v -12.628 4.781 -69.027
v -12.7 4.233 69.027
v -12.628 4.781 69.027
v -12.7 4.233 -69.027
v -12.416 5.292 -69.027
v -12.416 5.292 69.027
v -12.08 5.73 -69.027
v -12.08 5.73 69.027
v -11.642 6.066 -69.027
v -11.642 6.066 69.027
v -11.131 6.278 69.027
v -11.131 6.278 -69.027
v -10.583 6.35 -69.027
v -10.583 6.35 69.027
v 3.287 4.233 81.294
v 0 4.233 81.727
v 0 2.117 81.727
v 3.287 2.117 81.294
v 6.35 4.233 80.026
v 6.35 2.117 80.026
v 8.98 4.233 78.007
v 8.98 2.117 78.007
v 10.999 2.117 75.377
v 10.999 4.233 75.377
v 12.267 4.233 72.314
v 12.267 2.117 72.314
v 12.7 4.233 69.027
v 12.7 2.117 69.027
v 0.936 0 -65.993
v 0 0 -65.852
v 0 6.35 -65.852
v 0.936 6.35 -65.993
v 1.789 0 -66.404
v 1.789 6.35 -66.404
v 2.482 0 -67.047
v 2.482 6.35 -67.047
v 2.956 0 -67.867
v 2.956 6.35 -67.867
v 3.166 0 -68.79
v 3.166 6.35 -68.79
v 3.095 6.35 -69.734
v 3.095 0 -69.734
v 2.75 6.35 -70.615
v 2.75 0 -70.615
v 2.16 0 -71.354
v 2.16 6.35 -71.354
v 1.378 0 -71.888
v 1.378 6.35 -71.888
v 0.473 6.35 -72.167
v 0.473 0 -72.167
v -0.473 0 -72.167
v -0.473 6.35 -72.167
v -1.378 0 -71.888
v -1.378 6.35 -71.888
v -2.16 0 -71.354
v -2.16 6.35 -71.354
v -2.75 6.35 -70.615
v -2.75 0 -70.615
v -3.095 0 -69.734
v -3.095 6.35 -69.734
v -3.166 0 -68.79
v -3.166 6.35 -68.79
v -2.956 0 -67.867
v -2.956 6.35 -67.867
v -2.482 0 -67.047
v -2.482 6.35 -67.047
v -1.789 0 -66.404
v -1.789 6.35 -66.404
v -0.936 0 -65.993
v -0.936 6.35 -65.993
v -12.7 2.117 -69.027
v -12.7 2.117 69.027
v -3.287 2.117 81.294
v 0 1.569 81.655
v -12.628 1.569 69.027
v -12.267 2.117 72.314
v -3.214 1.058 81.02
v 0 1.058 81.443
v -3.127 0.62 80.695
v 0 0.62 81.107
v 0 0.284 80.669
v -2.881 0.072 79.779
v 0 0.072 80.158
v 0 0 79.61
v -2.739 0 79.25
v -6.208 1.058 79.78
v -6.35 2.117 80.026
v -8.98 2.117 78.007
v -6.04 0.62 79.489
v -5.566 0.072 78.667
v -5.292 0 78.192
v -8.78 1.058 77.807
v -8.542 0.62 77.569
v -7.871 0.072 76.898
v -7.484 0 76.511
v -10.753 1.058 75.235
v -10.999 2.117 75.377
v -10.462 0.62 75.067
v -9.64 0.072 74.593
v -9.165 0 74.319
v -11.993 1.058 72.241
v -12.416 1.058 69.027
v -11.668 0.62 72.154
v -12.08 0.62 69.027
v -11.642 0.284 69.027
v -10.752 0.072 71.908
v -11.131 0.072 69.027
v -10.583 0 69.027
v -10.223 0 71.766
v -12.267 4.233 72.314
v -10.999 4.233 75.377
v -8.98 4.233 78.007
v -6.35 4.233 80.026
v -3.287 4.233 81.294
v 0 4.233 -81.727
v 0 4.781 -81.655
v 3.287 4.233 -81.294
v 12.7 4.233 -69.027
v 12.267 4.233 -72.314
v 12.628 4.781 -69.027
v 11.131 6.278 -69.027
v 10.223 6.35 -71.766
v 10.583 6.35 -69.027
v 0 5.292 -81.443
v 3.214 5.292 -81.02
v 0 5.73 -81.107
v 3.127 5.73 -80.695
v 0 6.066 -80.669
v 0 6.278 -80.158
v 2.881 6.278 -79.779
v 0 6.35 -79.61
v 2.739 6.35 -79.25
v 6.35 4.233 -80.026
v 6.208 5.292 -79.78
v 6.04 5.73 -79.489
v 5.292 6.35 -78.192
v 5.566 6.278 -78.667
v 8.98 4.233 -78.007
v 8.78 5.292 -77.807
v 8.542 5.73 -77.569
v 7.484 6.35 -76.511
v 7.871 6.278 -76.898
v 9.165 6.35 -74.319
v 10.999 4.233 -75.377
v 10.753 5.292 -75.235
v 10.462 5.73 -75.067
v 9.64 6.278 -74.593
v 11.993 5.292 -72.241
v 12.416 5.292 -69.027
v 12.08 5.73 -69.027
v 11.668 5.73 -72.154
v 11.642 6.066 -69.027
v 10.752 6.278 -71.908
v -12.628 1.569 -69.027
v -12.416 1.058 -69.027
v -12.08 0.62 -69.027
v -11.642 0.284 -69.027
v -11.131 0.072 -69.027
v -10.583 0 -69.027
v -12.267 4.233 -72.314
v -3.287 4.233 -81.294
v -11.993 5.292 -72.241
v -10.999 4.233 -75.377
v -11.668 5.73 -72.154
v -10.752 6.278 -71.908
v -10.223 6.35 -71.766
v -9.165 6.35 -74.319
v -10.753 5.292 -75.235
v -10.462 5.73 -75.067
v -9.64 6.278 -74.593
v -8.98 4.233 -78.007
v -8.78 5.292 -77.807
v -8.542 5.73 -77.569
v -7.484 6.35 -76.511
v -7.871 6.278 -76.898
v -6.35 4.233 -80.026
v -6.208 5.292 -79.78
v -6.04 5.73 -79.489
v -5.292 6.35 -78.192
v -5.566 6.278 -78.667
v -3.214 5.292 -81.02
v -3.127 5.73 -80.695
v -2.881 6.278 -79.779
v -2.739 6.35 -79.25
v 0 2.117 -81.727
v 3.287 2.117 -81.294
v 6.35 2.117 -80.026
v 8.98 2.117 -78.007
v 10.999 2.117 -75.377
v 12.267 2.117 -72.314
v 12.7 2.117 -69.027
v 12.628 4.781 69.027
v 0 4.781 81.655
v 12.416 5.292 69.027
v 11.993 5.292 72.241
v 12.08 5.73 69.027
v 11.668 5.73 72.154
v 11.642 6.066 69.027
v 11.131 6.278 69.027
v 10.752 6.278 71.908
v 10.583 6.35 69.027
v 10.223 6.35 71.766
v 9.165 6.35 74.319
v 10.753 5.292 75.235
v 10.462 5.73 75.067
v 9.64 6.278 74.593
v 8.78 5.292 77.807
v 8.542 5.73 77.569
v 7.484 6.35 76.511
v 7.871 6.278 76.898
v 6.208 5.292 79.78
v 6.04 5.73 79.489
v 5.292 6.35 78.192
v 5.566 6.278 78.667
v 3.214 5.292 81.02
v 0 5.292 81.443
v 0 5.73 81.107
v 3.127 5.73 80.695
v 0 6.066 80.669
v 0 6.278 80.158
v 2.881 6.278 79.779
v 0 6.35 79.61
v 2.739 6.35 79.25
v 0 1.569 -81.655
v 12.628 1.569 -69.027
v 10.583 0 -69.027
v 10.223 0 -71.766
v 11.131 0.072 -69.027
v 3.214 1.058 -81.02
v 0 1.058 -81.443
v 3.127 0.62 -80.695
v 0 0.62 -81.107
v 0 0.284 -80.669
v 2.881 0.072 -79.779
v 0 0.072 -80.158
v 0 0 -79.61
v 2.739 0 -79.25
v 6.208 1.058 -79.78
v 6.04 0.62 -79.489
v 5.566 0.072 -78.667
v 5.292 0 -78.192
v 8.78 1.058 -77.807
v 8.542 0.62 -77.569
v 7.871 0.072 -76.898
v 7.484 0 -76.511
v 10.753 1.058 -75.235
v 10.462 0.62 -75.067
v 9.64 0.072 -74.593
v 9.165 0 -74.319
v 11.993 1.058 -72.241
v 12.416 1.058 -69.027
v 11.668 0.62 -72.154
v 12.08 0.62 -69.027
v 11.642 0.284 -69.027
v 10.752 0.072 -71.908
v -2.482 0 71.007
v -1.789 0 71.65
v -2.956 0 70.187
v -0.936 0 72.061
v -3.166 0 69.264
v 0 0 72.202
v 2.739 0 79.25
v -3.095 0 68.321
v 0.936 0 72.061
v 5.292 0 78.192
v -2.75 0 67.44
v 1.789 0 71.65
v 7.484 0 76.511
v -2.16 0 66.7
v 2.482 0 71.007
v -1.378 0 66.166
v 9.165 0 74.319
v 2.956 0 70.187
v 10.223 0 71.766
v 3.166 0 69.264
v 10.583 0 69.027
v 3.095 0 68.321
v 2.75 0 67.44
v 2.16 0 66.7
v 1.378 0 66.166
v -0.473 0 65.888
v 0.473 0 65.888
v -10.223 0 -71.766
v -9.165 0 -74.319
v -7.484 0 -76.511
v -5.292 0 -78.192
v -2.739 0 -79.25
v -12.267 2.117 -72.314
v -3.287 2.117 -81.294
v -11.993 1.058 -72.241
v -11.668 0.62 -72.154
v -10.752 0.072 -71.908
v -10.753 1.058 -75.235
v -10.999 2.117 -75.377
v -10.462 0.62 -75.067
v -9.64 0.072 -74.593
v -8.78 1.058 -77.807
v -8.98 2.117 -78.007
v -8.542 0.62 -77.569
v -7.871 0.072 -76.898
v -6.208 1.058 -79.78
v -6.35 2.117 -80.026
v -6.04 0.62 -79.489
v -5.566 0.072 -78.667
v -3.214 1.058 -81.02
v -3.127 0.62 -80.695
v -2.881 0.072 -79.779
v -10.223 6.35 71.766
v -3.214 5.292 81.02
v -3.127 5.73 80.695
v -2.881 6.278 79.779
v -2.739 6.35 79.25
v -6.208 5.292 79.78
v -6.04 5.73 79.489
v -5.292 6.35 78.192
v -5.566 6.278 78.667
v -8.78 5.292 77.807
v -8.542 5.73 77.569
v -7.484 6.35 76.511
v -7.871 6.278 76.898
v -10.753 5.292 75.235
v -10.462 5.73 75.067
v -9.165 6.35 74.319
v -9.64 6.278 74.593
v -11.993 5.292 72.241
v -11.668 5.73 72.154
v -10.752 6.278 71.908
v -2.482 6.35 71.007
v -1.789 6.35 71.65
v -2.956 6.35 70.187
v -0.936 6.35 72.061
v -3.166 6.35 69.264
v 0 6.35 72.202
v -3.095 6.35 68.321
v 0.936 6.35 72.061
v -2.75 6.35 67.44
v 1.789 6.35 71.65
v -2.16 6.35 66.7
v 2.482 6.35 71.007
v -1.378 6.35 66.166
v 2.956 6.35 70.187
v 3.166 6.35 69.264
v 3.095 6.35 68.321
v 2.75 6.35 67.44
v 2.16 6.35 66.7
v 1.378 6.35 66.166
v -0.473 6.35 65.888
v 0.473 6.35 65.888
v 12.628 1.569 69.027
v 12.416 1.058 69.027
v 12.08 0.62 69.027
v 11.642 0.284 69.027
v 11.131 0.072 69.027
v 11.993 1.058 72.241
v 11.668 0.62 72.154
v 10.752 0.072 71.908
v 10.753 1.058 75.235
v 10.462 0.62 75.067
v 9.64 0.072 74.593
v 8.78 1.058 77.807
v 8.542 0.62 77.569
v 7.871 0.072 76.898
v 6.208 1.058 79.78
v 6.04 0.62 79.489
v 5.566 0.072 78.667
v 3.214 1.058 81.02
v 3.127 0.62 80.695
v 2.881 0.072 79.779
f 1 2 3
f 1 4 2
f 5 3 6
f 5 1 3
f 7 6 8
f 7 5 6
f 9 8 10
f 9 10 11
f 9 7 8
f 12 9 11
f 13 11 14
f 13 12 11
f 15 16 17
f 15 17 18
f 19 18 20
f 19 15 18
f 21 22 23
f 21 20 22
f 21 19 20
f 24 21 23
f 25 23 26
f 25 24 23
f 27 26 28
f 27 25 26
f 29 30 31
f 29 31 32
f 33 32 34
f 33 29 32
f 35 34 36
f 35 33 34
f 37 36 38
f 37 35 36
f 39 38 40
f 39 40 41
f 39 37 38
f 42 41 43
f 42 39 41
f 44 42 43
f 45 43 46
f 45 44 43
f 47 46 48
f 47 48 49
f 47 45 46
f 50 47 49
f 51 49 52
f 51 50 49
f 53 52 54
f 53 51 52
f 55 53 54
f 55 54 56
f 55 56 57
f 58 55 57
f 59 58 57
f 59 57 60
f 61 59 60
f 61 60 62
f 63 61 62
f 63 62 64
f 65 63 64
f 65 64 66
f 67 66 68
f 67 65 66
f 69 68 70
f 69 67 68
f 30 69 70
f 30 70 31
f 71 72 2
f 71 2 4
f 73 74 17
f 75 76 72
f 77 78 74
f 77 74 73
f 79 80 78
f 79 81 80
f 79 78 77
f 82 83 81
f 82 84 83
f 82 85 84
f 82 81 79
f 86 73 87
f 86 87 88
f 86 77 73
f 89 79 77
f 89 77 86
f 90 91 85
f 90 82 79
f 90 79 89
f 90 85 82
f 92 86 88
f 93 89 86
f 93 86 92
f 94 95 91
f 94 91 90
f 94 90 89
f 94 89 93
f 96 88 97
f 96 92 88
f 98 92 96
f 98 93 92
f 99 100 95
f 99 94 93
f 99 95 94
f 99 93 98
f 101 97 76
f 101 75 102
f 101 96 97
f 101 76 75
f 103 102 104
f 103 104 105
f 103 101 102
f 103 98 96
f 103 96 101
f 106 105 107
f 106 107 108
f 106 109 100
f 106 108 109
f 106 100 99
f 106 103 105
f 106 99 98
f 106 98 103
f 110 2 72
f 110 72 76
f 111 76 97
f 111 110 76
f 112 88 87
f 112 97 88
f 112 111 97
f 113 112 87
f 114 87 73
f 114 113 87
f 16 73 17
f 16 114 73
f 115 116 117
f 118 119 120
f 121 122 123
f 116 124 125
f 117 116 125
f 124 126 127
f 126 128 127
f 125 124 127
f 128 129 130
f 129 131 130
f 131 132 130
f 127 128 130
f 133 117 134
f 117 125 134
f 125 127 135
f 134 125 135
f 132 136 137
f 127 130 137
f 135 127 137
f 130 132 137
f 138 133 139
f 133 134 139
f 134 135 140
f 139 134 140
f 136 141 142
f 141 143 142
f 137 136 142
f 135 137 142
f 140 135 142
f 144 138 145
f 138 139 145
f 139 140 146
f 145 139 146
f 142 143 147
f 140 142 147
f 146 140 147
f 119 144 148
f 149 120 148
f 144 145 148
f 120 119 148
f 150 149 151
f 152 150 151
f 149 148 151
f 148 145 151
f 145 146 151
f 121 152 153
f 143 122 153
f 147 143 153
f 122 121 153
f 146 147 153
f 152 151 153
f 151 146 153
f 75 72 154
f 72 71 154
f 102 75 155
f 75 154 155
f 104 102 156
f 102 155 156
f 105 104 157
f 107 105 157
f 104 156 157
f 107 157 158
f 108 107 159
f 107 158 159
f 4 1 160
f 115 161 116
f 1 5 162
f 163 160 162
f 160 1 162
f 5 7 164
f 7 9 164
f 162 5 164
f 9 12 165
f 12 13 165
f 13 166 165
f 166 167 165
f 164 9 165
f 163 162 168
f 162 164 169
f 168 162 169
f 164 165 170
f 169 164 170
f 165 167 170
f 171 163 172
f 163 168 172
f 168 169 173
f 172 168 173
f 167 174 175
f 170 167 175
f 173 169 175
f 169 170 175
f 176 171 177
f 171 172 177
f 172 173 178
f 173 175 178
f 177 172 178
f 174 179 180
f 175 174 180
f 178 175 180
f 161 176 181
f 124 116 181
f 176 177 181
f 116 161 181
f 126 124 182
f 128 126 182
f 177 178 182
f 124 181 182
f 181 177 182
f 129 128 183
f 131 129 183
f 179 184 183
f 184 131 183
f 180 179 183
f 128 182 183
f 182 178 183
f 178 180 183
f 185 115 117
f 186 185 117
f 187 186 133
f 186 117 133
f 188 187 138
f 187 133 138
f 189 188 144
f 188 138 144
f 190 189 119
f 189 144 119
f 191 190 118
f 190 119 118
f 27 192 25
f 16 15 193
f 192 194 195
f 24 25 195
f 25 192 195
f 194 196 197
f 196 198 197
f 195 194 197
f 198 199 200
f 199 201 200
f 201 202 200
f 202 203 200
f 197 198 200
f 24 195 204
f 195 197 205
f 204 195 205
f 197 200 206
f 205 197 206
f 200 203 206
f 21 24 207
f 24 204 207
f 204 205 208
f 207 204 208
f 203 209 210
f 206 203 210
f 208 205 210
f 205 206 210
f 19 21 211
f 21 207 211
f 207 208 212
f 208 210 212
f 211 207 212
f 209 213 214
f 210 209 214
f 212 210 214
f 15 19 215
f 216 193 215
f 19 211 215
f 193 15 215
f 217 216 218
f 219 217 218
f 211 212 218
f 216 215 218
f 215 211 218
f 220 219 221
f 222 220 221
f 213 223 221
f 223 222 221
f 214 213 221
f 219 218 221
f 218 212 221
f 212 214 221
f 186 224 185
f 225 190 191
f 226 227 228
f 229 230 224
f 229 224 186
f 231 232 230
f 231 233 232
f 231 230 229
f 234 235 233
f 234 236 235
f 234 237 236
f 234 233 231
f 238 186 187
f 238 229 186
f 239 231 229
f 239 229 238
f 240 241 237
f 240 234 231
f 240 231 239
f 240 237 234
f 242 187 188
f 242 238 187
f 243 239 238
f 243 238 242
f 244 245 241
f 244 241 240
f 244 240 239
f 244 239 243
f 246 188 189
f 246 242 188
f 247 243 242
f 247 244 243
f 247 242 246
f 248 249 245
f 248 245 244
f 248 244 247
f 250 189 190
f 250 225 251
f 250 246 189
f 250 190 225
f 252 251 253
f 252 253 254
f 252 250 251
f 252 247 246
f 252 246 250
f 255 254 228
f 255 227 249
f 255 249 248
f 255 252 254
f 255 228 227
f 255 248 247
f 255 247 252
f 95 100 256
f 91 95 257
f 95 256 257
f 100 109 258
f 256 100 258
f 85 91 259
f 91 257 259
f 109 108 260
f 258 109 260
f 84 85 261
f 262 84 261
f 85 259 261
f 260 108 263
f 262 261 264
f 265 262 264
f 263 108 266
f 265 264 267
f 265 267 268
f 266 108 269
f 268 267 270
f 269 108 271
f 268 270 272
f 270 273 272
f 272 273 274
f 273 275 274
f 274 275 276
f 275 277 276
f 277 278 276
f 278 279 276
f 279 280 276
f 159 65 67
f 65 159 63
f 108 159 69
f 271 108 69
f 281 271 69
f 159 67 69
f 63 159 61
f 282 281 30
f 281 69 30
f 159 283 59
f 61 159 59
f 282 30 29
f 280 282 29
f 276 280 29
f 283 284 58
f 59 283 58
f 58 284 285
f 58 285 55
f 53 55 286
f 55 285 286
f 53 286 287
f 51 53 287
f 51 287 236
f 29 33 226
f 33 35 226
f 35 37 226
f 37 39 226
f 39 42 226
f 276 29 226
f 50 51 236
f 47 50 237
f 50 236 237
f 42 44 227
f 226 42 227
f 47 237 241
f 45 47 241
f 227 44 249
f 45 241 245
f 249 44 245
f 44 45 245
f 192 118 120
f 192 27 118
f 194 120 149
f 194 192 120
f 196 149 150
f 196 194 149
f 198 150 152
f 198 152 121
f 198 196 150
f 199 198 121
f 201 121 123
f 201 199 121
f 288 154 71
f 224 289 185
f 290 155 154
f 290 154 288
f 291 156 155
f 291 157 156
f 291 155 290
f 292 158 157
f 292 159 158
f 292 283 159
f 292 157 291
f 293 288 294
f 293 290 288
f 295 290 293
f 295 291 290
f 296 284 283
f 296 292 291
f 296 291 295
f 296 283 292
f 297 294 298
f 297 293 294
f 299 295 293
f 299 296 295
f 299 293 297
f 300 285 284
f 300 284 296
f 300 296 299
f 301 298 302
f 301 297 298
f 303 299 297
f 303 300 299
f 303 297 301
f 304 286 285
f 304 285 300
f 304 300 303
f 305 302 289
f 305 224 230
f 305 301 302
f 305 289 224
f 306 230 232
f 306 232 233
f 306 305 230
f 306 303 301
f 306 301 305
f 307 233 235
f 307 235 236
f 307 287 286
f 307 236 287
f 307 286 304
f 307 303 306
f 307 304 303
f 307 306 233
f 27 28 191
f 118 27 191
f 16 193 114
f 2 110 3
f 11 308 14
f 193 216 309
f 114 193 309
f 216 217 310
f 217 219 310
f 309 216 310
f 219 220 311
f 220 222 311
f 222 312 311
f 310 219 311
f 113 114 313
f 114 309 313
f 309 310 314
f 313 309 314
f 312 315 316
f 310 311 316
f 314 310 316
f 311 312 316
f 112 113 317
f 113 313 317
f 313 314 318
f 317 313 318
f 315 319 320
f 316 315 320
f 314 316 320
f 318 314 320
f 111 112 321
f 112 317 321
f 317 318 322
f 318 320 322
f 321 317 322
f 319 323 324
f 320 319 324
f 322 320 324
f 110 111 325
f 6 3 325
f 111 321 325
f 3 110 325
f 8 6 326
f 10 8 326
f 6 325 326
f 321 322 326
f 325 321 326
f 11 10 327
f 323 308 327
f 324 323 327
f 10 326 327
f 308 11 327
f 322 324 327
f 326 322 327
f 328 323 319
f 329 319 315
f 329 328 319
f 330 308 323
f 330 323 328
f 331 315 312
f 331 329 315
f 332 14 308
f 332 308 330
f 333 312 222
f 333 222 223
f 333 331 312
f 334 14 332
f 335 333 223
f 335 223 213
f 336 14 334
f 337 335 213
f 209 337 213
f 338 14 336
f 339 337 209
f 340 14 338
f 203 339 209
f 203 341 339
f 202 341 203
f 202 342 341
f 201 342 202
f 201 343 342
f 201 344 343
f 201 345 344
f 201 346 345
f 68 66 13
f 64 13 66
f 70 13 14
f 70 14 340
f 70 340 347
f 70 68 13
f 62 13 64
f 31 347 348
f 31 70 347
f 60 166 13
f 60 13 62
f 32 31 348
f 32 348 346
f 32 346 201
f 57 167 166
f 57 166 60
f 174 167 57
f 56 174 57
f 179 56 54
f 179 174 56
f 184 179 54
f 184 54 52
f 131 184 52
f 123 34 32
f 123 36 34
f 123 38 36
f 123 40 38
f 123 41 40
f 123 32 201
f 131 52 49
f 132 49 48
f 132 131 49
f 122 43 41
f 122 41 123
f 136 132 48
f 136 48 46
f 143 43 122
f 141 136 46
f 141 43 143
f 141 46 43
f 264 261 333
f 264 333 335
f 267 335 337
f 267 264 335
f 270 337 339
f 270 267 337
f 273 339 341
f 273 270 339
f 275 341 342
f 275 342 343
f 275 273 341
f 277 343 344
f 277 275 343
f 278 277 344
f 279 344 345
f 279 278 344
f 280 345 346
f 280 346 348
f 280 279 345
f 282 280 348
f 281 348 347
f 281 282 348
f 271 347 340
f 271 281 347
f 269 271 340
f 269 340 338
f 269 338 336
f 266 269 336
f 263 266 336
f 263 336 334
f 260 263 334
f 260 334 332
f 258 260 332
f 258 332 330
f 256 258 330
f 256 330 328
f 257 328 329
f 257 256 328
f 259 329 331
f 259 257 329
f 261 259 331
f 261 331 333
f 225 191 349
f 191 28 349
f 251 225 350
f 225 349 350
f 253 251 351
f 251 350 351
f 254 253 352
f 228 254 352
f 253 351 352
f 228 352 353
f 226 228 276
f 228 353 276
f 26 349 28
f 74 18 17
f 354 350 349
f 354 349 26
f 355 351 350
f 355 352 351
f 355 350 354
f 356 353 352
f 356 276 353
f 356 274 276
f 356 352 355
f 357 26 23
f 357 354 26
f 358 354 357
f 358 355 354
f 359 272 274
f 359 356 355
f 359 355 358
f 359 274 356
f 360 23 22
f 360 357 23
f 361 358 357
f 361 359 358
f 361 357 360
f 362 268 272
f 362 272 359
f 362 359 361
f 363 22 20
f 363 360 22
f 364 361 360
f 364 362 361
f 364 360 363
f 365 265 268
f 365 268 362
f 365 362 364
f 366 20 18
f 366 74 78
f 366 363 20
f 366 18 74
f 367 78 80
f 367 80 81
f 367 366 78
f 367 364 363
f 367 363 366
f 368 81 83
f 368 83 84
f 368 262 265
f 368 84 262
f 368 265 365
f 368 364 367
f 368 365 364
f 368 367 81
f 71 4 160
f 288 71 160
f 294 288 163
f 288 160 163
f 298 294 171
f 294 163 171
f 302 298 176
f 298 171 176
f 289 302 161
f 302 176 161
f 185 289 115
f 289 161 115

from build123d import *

# Parameters (mm, degrees)
SKETCH1_W           = 25.4
SKETCH1_H           = 163.454078658
SKETCH1_R           = 3.175
BOSS_EXTRUDE1_DEPTH = 6.35
FILLET2_R           = 12.7
FILLET3_R           = 2.116666667


with BuildPart() as part:
    # Sketch1 → Boss-Extrude1 (new body)
    with BuildSketch(Plane(origin=(0, 0, 0), x_dir=(1, 0, 0), z_dir=(0, 1, 0))):
        Rectangle(SKETCH1_W, SKETCH1_H)
        with Locations(Location((0, -69.027039329, 0), (0, 0, 270))):
            Circle(SKETCH1_R, mode=Mode.SUBTRACT)
        with Locations(Location((0, 69.027039329, 0), (0, 0, 270))):
            Circle(SKETCH1_R, mode=Mode.SUBTRACT)
    extrude(amount=BOSS_EXTRUDE1_DEPTH)

    # Fillet2
    fillet2_edges = [part.edges().sort_by_distance(p)[0] for p in [
        (-12.7, 3.175, -81.727039329),
        (12.7, 3.175, -81.727039329),
        (-12.7, 3.175, 81.727039329),
        (12.7, 3.175, 81.727039329),
    ]]
    fillet(fillet2_edges, radius=FILLET2_R - 0.0001)  # a hair under: the kernel refuses the full size

    # Fillet3
    fillet3_edges = [part.edges().sort_by_distance(p)[0] for p in [
        (-12.7, 0, 0),
        (-12.7, 6.35, 0),
        (12.7, 0, 0),
        (8.98028541, 0, 78.007324739),
        (-8.98028541, 0, 78.007324739),
        (8.98028541, 0, -78.007324739),
        (-8.98028541, 0, -78.007324739),
        (12.7, 6.35, 0),
        (8.98028541, 6.35, 78.007324739),
        (-8.98028541, 6.35, 78.007324739),
        (8.98028541, 6.35, -78.007324739),
        (-8.98028541, 6.35, -78.007324739),
    ]]
    fillet(fillet3_edges, radius=FILLET3_R)


solid = part.part
